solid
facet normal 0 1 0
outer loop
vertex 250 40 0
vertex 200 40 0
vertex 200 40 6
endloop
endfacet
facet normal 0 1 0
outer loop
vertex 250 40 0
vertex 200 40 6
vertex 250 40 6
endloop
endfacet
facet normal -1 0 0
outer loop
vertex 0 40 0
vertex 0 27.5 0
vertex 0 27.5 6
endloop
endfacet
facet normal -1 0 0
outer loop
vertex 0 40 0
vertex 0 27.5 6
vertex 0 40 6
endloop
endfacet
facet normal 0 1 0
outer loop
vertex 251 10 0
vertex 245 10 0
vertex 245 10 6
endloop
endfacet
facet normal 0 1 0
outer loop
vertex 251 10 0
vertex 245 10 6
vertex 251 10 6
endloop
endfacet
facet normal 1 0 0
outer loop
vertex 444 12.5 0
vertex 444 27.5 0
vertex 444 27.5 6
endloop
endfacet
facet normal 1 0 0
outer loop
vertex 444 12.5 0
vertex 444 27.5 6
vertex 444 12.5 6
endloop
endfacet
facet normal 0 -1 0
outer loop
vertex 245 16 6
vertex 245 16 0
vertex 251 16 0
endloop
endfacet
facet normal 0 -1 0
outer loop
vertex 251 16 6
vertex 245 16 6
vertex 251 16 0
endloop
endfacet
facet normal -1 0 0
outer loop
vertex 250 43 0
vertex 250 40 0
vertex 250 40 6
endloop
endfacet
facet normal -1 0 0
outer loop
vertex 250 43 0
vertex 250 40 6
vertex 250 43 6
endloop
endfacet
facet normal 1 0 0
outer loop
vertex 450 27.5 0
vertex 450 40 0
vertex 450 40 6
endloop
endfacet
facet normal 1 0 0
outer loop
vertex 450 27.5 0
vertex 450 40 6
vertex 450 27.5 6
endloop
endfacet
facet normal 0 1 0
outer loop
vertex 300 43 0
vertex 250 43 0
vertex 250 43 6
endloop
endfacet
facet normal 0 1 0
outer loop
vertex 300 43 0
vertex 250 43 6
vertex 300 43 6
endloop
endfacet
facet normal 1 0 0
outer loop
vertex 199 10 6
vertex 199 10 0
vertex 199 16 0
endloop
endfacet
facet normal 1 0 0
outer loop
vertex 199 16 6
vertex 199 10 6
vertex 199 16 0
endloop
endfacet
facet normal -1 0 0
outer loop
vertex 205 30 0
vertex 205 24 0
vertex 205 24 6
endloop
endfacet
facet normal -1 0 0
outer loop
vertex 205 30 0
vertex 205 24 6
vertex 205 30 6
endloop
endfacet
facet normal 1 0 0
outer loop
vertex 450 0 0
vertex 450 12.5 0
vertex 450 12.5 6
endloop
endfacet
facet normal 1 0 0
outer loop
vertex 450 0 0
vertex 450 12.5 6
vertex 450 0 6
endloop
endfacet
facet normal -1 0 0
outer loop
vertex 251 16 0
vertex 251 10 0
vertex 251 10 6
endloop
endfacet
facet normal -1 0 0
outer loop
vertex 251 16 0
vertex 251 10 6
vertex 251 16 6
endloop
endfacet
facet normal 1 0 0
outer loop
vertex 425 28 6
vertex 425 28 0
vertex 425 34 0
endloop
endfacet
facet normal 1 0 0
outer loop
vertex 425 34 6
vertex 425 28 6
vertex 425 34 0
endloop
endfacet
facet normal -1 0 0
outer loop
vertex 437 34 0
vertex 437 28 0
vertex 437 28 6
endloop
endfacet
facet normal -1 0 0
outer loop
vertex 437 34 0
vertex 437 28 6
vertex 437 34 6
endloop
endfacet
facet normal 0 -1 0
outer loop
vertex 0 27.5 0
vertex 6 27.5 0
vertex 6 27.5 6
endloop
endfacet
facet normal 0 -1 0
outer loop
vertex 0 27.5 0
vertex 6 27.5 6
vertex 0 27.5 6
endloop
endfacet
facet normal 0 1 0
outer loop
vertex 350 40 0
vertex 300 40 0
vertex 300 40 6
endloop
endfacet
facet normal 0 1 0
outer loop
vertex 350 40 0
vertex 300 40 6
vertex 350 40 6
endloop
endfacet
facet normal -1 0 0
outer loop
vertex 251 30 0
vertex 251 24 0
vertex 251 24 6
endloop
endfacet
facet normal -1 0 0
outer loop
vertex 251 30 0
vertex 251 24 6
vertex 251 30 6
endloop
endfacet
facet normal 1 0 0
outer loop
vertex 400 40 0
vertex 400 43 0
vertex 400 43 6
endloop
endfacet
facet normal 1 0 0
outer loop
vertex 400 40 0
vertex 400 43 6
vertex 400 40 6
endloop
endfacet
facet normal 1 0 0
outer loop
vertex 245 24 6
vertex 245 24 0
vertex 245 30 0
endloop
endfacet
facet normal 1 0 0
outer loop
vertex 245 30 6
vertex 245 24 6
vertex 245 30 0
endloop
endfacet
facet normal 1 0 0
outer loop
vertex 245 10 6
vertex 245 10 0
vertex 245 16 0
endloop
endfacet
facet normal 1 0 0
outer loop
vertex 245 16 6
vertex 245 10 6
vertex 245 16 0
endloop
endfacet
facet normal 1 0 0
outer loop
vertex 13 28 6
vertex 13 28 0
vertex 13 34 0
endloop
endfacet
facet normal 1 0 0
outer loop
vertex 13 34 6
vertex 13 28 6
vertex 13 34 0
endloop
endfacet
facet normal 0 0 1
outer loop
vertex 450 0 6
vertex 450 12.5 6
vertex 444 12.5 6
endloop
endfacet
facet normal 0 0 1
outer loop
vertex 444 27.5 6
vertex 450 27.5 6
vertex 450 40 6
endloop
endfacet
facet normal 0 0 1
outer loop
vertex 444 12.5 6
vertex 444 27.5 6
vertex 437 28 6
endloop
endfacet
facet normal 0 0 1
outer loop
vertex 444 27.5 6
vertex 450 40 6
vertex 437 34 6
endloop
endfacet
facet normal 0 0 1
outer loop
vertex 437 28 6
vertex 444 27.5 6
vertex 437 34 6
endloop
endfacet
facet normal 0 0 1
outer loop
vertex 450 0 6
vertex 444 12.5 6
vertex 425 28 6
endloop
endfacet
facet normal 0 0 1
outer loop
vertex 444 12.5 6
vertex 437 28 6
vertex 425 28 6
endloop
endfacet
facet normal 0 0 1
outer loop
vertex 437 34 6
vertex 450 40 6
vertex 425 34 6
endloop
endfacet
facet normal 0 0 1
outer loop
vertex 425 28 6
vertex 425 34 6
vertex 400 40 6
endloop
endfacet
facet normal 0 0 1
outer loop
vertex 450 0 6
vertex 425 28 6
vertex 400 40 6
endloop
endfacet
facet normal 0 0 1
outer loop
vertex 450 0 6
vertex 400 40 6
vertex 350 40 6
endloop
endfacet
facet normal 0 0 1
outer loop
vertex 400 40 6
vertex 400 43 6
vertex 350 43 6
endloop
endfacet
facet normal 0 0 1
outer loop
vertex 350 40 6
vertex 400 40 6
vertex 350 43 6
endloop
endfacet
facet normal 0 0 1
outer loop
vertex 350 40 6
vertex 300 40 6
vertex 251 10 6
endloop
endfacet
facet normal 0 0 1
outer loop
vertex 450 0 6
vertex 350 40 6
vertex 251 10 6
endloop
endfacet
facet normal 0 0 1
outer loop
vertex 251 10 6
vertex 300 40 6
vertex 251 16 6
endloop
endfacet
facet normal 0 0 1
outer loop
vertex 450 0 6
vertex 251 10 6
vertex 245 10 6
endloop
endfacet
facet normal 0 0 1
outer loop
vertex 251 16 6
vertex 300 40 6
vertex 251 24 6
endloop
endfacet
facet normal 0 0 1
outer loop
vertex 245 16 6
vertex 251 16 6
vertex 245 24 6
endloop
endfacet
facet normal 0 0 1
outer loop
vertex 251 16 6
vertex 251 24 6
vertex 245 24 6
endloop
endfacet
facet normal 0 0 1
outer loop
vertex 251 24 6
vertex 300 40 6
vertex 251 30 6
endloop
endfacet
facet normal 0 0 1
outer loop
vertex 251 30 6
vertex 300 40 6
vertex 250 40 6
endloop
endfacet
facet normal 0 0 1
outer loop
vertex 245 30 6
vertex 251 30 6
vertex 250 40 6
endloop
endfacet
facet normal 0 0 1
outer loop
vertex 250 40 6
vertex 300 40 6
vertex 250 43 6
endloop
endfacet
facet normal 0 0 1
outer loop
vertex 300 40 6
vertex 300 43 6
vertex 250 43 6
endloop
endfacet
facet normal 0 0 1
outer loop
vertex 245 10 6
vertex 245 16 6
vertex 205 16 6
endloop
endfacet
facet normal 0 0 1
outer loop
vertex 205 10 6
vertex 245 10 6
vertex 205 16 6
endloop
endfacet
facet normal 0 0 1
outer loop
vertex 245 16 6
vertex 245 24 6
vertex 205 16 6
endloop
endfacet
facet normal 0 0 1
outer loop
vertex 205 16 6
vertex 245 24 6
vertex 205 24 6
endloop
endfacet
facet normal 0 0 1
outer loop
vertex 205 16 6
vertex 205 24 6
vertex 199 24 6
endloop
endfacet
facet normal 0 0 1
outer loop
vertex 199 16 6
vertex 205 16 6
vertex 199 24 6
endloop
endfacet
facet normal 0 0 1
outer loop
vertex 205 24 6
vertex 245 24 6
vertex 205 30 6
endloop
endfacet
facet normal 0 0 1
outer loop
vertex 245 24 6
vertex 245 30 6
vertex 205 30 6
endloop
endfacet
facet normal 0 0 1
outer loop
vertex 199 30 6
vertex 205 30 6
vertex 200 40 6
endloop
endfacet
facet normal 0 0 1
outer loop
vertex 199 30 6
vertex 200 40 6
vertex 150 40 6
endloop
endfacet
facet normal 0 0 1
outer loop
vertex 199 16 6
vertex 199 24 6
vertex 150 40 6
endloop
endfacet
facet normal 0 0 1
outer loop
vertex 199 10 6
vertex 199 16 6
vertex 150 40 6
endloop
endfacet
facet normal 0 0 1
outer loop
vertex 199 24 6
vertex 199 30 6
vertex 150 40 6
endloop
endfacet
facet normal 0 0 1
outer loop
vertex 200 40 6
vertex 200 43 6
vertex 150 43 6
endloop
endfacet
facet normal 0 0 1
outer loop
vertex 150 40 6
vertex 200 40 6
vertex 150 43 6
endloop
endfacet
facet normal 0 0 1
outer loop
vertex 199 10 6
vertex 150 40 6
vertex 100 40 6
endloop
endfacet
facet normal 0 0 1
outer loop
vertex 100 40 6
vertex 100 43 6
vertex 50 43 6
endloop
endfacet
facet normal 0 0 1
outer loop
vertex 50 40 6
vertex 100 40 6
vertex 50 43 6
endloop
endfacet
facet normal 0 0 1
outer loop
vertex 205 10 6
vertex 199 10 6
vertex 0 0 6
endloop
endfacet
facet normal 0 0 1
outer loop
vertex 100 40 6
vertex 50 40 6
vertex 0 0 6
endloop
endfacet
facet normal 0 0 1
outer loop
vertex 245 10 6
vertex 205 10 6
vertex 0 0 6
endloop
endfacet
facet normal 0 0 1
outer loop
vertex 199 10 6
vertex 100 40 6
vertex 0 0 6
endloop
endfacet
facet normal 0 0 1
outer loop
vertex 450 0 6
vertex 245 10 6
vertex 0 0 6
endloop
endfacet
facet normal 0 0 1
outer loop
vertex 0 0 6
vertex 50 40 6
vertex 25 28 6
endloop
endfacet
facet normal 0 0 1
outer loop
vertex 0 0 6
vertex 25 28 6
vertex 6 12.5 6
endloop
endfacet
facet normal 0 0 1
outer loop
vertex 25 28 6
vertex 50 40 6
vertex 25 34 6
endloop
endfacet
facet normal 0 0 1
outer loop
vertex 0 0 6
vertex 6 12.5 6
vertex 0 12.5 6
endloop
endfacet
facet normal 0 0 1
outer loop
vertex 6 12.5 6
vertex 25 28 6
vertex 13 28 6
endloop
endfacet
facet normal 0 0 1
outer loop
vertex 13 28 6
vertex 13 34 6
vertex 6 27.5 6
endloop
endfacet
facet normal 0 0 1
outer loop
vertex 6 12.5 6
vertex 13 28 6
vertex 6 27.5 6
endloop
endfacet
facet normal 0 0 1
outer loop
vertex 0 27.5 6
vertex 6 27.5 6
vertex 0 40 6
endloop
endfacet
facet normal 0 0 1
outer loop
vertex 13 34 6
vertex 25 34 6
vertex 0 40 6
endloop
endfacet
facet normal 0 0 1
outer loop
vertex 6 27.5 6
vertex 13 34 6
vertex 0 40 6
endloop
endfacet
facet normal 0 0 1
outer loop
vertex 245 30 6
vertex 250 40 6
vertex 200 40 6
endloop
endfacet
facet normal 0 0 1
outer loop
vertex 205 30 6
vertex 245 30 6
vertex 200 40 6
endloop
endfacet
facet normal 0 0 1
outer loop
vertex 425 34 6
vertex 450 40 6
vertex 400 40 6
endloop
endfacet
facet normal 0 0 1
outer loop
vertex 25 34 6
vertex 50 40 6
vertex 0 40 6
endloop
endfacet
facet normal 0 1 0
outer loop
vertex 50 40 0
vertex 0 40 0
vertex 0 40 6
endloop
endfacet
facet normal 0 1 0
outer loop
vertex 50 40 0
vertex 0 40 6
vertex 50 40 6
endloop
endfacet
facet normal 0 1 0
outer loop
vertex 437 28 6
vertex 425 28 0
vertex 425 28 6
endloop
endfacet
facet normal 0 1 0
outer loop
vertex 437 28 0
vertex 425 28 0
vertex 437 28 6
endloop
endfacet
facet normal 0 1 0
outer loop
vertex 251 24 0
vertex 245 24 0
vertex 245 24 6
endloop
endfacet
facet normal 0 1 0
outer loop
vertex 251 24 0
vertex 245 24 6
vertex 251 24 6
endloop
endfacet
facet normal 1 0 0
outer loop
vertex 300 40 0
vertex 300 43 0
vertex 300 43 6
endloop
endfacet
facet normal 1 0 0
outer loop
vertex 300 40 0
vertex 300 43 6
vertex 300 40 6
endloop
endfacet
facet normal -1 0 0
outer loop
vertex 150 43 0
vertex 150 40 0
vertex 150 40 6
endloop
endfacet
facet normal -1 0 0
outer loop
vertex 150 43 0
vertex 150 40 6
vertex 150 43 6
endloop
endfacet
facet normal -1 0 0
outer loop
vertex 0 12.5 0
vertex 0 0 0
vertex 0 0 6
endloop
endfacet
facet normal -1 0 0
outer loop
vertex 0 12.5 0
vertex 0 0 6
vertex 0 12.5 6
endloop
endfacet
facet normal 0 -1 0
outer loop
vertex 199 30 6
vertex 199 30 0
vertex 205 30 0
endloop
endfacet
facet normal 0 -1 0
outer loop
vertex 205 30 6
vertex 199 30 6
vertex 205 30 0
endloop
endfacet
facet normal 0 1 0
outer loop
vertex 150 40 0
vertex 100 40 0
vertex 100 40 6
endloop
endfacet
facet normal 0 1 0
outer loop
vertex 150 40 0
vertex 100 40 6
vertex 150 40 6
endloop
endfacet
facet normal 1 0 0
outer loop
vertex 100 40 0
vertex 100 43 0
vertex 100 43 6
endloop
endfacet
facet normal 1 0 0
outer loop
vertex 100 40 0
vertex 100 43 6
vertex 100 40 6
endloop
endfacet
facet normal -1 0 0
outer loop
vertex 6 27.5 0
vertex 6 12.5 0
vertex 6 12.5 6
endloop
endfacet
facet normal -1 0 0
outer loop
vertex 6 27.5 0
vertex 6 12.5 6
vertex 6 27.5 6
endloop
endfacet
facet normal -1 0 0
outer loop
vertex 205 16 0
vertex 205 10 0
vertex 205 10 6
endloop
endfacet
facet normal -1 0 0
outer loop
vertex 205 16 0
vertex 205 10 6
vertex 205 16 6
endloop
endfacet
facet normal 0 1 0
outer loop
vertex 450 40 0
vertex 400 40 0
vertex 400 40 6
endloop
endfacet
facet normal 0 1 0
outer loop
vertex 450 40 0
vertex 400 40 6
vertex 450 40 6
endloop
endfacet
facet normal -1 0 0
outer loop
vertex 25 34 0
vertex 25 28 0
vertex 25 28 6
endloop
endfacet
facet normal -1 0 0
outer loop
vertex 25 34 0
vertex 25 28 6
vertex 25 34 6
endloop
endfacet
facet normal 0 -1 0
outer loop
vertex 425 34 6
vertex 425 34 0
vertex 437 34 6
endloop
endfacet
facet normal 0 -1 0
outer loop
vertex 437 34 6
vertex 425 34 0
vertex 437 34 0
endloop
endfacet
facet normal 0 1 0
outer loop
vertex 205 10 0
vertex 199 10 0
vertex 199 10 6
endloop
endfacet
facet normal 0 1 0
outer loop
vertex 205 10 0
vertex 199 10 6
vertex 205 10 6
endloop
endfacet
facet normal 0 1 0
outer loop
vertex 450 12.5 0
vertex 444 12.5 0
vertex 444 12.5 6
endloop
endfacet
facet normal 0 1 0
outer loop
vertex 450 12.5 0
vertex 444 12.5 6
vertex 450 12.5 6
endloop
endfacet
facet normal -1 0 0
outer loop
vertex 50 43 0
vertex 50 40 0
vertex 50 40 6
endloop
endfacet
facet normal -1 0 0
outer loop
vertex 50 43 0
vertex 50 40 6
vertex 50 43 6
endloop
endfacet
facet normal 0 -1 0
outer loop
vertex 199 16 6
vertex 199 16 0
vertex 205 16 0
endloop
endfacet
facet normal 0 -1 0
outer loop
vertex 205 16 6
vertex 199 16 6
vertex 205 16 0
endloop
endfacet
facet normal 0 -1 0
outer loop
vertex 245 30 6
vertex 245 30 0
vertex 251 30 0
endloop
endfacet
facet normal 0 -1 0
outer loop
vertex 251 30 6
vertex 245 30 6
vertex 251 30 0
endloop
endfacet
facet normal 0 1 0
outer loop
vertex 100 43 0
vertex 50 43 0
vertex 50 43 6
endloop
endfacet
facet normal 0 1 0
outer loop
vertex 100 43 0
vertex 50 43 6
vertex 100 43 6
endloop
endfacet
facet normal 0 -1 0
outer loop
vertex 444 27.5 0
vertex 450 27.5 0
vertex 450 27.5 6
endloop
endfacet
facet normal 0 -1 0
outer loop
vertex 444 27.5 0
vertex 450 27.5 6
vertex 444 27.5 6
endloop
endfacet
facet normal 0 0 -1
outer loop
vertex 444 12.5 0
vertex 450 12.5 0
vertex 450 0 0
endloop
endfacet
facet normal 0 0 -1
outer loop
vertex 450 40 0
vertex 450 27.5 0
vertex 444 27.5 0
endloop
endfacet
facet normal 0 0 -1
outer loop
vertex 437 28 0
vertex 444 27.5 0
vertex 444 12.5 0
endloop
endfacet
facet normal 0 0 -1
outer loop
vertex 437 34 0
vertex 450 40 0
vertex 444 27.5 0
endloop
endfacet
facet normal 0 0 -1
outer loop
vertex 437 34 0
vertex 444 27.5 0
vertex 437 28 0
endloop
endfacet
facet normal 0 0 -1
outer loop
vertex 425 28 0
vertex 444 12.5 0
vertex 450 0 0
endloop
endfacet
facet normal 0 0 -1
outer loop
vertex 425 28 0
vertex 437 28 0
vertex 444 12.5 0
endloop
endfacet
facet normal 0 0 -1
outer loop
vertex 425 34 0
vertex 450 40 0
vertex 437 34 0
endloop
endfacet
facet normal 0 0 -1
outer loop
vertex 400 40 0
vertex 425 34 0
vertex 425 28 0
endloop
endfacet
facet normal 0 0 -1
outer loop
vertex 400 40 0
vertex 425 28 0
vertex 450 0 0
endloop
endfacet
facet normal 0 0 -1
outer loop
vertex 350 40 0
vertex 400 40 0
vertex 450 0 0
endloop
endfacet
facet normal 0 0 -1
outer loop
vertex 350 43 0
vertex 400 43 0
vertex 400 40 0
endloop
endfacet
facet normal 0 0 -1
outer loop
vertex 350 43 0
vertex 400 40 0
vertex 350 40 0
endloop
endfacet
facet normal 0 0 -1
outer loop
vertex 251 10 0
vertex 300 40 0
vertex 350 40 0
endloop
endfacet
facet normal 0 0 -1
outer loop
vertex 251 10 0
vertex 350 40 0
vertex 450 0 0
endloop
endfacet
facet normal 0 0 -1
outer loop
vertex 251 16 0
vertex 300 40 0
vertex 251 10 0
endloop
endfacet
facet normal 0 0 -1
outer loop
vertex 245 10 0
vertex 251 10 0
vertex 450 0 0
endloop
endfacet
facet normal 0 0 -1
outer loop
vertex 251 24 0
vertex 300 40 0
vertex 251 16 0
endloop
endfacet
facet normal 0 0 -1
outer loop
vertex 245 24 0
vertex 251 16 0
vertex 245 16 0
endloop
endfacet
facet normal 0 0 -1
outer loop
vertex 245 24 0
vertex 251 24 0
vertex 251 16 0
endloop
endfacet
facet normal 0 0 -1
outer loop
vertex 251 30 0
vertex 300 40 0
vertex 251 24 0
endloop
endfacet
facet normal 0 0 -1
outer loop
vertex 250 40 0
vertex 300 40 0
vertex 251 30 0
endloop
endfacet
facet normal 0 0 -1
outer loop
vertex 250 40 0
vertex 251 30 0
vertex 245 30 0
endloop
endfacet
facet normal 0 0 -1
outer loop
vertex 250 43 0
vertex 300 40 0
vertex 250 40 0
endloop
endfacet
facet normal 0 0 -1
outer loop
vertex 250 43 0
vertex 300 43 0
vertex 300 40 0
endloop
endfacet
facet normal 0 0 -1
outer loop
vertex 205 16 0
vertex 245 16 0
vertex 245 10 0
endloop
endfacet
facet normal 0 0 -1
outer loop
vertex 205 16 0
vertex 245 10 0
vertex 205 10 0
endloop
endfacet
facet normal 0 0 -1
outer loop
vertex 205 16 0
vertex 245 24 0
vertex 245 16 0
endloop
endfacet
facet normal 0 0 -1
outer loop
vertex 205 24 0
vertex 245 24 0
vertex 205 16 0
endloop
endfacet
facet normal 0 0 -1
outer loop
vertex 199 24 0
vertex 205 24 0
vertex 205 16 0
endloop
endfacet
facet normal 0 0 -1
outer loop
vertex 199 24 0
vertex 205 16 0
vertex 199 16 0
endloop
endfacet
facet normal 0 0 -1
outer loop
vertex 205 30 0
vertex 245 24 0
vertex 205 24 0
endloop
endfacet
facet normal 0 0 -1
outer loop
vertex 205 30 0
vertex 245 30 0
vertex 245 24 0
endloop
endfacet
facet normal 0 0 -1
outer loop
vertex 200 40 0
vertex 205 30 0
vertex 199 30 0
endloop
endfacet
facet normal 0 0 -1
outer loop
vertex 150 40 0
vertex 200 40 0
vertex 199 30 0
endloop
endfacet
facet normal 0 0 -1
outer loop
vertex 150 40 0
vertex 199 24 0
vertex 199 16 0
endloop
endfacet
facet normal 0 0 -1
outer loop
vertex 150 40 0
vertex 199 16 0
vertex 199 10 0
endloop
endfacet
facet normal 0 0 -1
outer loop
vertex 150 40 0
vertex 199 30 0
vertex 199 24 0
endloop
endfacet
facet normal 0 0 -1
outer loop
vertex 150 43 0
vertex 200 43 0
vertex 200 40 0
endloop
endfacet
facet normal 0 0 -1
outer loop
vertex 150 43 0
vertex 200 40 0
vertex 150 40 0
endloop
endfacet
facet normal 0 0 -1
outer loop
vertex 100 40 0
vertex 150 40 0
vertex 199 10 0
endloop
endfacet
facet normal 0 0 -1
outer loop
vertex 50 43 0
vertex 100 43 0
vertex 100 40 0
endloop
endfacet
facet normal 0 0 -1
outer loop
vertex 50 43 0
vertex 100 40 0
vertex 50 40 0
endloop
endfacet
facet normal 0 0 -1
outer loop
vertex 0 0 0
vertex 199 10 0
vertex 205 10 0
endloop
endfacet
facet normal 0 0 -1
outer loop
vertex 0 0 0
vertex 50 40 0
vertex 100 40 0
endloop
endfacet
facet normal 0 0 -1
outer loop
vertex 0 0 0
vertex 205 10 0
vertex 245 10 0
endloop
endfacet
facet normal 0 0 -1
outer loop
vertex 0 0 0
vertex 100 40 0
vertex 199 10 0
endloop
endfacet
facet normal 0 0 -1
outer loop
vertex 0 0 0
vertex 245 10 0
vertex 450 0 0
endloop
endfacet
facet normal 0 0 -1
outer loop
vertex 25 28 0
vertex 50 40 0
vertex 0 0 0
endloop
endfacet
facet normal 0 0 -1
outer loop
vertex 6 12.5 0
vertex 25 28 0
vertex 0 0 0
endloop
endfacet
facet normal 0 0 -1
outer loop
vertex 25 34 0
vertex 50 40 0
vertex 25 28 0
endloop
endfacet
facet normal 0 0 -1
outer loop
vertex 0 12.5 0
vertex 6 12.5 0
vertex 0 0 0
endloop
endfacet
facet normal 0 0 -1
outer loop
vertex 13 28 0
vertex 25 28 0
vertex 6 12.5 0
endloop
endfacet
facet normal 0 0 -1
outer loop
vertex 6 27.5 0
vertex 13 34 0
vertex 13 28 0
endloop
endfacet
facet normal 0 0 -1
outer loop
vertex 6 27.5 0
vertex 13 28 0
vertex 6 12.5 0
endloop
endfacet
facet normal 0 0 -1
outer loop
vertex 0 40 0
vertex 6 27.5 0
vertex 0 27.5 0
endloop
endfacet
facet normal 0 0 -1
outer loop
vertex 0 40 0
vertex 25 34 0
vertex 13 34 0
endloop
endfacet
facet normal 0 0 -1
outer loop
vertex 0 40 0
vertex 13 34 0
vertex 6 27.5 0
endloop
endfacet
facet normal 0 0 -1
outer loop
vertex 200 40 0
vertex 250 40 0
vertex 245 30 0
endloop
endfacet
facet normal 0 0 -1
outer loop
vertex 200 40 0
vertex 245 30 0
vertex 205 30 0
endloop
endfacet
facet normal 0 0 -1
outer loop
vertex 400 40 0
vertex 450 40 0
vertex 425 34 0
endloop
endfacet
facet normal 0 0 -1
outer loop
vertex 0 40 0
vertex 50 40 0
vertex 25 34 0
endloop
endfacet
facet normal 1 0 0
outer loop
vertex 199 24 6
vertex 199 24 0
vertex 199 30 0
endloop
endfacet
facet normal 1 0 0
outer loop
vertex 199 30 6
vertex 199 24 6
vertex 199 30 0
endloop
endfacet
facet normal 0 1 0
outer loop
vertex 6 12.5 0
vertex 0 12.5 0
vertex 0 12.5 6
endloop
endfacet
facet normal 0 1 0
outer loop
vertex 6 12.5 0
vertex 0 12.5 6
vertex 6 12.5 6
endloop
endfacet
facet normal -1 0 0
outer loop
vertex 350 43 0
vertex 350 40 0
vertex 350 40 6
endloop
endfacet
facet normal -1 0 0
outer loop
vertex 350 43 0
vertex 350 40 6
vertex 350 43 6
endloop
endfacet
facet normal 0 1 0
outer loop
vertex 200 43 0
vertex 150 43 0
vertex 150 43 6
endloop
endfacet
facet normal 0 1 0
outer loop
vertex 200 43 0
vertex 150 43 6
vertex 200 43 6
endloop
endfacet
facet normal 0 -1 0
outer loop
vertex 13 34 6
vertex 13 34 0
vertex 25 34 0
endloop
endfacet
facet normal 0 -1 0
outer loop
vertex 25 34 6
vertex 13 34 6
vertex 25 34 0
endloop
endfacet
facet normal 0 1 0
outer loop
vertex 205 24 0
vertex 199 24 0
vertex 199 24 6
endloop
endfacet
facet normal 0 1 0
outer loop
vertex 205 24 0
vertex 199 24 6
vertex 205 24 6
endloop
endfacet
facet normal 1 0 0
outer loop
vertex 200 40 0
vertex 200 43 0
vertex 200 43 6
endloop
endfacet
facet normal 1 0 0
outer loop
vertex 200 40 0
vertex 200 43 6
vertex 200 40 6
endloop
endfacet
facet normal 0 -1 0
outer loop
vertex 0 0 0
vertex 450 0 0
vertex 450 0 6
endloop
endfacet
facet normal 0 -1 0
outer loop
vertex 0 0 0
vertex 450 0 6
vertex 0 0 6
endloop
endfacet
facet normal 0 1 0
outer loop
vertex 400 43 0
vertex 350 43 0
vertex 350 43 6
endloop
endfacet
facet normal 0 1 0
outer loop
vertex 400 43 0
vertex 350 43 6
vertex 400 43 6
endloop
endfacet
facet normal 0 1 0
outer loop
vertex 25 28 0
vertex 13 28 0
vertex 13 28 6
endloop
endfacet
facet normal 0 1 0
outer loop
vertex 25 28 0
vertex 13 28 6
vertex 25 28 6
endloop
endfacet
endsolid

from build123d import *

# Parameters (mm, degrees)
SKETCH_1_W      = 12
SKETCH_1_H      = 6
SKETCH_1_W_2    = 6
EXTRUDE_1_DEPTH = 6


with BuildPart() as part:
    # Эскиз1 → Бобышка-Вытянуть1 (new body)
    with BuildSketch(Plane.XY):
        Polygon((100, 40), (150, 40), (150, 43), (200, 43), (200, 40), (250, 40), (250, 43), (300, 43), (300, 40), (350, 40), (350, 43), (400, 43), (400, 40), (450, 40), (450, 27.5), (444, 27.5), (444, 12.5), (450, 12.5), (450, 0), (0, 0), (0, 12.5), (6, 12.5), (6, 27.5), (0, 27.5), (0, 40), (50, 40), (50, 43), (100, 43), align=None)
        with Locations((19, 31)):
            Rectangle(SKETCH_1_W, SKETCH_1_H, mode=Mode.SUBTRACT)
        with Locations((431, 31)):
            Rectangle(SKETCH_1_W, SKETCH_1_H, mode=Mode.SUBTRACT)
        with Locations((248, 27)):
            Rectangle(SKETCH_1_W_2, SKETCH_1_H, mode=Mode.SUBTRACT)
        with Locations((248, 13)):
            Rectangle(SKETCH_1_W_2, SKETCH_1_H, mode=Mode.SUBTRACT)
        with Locations((202, 27)):
            Rectangle(SKETCH_1_W_2, SKETCH_1_H, mode=Mode.SUBTRACT)
        with Locations((202, 13)):
            Rectangle(SKETCH_1_W_2, SKETCH_1_H, mode=Mode.SUBTRACT)
    extrude(amount=EXTRUDE_1_DEPTH)


solid = part.part
